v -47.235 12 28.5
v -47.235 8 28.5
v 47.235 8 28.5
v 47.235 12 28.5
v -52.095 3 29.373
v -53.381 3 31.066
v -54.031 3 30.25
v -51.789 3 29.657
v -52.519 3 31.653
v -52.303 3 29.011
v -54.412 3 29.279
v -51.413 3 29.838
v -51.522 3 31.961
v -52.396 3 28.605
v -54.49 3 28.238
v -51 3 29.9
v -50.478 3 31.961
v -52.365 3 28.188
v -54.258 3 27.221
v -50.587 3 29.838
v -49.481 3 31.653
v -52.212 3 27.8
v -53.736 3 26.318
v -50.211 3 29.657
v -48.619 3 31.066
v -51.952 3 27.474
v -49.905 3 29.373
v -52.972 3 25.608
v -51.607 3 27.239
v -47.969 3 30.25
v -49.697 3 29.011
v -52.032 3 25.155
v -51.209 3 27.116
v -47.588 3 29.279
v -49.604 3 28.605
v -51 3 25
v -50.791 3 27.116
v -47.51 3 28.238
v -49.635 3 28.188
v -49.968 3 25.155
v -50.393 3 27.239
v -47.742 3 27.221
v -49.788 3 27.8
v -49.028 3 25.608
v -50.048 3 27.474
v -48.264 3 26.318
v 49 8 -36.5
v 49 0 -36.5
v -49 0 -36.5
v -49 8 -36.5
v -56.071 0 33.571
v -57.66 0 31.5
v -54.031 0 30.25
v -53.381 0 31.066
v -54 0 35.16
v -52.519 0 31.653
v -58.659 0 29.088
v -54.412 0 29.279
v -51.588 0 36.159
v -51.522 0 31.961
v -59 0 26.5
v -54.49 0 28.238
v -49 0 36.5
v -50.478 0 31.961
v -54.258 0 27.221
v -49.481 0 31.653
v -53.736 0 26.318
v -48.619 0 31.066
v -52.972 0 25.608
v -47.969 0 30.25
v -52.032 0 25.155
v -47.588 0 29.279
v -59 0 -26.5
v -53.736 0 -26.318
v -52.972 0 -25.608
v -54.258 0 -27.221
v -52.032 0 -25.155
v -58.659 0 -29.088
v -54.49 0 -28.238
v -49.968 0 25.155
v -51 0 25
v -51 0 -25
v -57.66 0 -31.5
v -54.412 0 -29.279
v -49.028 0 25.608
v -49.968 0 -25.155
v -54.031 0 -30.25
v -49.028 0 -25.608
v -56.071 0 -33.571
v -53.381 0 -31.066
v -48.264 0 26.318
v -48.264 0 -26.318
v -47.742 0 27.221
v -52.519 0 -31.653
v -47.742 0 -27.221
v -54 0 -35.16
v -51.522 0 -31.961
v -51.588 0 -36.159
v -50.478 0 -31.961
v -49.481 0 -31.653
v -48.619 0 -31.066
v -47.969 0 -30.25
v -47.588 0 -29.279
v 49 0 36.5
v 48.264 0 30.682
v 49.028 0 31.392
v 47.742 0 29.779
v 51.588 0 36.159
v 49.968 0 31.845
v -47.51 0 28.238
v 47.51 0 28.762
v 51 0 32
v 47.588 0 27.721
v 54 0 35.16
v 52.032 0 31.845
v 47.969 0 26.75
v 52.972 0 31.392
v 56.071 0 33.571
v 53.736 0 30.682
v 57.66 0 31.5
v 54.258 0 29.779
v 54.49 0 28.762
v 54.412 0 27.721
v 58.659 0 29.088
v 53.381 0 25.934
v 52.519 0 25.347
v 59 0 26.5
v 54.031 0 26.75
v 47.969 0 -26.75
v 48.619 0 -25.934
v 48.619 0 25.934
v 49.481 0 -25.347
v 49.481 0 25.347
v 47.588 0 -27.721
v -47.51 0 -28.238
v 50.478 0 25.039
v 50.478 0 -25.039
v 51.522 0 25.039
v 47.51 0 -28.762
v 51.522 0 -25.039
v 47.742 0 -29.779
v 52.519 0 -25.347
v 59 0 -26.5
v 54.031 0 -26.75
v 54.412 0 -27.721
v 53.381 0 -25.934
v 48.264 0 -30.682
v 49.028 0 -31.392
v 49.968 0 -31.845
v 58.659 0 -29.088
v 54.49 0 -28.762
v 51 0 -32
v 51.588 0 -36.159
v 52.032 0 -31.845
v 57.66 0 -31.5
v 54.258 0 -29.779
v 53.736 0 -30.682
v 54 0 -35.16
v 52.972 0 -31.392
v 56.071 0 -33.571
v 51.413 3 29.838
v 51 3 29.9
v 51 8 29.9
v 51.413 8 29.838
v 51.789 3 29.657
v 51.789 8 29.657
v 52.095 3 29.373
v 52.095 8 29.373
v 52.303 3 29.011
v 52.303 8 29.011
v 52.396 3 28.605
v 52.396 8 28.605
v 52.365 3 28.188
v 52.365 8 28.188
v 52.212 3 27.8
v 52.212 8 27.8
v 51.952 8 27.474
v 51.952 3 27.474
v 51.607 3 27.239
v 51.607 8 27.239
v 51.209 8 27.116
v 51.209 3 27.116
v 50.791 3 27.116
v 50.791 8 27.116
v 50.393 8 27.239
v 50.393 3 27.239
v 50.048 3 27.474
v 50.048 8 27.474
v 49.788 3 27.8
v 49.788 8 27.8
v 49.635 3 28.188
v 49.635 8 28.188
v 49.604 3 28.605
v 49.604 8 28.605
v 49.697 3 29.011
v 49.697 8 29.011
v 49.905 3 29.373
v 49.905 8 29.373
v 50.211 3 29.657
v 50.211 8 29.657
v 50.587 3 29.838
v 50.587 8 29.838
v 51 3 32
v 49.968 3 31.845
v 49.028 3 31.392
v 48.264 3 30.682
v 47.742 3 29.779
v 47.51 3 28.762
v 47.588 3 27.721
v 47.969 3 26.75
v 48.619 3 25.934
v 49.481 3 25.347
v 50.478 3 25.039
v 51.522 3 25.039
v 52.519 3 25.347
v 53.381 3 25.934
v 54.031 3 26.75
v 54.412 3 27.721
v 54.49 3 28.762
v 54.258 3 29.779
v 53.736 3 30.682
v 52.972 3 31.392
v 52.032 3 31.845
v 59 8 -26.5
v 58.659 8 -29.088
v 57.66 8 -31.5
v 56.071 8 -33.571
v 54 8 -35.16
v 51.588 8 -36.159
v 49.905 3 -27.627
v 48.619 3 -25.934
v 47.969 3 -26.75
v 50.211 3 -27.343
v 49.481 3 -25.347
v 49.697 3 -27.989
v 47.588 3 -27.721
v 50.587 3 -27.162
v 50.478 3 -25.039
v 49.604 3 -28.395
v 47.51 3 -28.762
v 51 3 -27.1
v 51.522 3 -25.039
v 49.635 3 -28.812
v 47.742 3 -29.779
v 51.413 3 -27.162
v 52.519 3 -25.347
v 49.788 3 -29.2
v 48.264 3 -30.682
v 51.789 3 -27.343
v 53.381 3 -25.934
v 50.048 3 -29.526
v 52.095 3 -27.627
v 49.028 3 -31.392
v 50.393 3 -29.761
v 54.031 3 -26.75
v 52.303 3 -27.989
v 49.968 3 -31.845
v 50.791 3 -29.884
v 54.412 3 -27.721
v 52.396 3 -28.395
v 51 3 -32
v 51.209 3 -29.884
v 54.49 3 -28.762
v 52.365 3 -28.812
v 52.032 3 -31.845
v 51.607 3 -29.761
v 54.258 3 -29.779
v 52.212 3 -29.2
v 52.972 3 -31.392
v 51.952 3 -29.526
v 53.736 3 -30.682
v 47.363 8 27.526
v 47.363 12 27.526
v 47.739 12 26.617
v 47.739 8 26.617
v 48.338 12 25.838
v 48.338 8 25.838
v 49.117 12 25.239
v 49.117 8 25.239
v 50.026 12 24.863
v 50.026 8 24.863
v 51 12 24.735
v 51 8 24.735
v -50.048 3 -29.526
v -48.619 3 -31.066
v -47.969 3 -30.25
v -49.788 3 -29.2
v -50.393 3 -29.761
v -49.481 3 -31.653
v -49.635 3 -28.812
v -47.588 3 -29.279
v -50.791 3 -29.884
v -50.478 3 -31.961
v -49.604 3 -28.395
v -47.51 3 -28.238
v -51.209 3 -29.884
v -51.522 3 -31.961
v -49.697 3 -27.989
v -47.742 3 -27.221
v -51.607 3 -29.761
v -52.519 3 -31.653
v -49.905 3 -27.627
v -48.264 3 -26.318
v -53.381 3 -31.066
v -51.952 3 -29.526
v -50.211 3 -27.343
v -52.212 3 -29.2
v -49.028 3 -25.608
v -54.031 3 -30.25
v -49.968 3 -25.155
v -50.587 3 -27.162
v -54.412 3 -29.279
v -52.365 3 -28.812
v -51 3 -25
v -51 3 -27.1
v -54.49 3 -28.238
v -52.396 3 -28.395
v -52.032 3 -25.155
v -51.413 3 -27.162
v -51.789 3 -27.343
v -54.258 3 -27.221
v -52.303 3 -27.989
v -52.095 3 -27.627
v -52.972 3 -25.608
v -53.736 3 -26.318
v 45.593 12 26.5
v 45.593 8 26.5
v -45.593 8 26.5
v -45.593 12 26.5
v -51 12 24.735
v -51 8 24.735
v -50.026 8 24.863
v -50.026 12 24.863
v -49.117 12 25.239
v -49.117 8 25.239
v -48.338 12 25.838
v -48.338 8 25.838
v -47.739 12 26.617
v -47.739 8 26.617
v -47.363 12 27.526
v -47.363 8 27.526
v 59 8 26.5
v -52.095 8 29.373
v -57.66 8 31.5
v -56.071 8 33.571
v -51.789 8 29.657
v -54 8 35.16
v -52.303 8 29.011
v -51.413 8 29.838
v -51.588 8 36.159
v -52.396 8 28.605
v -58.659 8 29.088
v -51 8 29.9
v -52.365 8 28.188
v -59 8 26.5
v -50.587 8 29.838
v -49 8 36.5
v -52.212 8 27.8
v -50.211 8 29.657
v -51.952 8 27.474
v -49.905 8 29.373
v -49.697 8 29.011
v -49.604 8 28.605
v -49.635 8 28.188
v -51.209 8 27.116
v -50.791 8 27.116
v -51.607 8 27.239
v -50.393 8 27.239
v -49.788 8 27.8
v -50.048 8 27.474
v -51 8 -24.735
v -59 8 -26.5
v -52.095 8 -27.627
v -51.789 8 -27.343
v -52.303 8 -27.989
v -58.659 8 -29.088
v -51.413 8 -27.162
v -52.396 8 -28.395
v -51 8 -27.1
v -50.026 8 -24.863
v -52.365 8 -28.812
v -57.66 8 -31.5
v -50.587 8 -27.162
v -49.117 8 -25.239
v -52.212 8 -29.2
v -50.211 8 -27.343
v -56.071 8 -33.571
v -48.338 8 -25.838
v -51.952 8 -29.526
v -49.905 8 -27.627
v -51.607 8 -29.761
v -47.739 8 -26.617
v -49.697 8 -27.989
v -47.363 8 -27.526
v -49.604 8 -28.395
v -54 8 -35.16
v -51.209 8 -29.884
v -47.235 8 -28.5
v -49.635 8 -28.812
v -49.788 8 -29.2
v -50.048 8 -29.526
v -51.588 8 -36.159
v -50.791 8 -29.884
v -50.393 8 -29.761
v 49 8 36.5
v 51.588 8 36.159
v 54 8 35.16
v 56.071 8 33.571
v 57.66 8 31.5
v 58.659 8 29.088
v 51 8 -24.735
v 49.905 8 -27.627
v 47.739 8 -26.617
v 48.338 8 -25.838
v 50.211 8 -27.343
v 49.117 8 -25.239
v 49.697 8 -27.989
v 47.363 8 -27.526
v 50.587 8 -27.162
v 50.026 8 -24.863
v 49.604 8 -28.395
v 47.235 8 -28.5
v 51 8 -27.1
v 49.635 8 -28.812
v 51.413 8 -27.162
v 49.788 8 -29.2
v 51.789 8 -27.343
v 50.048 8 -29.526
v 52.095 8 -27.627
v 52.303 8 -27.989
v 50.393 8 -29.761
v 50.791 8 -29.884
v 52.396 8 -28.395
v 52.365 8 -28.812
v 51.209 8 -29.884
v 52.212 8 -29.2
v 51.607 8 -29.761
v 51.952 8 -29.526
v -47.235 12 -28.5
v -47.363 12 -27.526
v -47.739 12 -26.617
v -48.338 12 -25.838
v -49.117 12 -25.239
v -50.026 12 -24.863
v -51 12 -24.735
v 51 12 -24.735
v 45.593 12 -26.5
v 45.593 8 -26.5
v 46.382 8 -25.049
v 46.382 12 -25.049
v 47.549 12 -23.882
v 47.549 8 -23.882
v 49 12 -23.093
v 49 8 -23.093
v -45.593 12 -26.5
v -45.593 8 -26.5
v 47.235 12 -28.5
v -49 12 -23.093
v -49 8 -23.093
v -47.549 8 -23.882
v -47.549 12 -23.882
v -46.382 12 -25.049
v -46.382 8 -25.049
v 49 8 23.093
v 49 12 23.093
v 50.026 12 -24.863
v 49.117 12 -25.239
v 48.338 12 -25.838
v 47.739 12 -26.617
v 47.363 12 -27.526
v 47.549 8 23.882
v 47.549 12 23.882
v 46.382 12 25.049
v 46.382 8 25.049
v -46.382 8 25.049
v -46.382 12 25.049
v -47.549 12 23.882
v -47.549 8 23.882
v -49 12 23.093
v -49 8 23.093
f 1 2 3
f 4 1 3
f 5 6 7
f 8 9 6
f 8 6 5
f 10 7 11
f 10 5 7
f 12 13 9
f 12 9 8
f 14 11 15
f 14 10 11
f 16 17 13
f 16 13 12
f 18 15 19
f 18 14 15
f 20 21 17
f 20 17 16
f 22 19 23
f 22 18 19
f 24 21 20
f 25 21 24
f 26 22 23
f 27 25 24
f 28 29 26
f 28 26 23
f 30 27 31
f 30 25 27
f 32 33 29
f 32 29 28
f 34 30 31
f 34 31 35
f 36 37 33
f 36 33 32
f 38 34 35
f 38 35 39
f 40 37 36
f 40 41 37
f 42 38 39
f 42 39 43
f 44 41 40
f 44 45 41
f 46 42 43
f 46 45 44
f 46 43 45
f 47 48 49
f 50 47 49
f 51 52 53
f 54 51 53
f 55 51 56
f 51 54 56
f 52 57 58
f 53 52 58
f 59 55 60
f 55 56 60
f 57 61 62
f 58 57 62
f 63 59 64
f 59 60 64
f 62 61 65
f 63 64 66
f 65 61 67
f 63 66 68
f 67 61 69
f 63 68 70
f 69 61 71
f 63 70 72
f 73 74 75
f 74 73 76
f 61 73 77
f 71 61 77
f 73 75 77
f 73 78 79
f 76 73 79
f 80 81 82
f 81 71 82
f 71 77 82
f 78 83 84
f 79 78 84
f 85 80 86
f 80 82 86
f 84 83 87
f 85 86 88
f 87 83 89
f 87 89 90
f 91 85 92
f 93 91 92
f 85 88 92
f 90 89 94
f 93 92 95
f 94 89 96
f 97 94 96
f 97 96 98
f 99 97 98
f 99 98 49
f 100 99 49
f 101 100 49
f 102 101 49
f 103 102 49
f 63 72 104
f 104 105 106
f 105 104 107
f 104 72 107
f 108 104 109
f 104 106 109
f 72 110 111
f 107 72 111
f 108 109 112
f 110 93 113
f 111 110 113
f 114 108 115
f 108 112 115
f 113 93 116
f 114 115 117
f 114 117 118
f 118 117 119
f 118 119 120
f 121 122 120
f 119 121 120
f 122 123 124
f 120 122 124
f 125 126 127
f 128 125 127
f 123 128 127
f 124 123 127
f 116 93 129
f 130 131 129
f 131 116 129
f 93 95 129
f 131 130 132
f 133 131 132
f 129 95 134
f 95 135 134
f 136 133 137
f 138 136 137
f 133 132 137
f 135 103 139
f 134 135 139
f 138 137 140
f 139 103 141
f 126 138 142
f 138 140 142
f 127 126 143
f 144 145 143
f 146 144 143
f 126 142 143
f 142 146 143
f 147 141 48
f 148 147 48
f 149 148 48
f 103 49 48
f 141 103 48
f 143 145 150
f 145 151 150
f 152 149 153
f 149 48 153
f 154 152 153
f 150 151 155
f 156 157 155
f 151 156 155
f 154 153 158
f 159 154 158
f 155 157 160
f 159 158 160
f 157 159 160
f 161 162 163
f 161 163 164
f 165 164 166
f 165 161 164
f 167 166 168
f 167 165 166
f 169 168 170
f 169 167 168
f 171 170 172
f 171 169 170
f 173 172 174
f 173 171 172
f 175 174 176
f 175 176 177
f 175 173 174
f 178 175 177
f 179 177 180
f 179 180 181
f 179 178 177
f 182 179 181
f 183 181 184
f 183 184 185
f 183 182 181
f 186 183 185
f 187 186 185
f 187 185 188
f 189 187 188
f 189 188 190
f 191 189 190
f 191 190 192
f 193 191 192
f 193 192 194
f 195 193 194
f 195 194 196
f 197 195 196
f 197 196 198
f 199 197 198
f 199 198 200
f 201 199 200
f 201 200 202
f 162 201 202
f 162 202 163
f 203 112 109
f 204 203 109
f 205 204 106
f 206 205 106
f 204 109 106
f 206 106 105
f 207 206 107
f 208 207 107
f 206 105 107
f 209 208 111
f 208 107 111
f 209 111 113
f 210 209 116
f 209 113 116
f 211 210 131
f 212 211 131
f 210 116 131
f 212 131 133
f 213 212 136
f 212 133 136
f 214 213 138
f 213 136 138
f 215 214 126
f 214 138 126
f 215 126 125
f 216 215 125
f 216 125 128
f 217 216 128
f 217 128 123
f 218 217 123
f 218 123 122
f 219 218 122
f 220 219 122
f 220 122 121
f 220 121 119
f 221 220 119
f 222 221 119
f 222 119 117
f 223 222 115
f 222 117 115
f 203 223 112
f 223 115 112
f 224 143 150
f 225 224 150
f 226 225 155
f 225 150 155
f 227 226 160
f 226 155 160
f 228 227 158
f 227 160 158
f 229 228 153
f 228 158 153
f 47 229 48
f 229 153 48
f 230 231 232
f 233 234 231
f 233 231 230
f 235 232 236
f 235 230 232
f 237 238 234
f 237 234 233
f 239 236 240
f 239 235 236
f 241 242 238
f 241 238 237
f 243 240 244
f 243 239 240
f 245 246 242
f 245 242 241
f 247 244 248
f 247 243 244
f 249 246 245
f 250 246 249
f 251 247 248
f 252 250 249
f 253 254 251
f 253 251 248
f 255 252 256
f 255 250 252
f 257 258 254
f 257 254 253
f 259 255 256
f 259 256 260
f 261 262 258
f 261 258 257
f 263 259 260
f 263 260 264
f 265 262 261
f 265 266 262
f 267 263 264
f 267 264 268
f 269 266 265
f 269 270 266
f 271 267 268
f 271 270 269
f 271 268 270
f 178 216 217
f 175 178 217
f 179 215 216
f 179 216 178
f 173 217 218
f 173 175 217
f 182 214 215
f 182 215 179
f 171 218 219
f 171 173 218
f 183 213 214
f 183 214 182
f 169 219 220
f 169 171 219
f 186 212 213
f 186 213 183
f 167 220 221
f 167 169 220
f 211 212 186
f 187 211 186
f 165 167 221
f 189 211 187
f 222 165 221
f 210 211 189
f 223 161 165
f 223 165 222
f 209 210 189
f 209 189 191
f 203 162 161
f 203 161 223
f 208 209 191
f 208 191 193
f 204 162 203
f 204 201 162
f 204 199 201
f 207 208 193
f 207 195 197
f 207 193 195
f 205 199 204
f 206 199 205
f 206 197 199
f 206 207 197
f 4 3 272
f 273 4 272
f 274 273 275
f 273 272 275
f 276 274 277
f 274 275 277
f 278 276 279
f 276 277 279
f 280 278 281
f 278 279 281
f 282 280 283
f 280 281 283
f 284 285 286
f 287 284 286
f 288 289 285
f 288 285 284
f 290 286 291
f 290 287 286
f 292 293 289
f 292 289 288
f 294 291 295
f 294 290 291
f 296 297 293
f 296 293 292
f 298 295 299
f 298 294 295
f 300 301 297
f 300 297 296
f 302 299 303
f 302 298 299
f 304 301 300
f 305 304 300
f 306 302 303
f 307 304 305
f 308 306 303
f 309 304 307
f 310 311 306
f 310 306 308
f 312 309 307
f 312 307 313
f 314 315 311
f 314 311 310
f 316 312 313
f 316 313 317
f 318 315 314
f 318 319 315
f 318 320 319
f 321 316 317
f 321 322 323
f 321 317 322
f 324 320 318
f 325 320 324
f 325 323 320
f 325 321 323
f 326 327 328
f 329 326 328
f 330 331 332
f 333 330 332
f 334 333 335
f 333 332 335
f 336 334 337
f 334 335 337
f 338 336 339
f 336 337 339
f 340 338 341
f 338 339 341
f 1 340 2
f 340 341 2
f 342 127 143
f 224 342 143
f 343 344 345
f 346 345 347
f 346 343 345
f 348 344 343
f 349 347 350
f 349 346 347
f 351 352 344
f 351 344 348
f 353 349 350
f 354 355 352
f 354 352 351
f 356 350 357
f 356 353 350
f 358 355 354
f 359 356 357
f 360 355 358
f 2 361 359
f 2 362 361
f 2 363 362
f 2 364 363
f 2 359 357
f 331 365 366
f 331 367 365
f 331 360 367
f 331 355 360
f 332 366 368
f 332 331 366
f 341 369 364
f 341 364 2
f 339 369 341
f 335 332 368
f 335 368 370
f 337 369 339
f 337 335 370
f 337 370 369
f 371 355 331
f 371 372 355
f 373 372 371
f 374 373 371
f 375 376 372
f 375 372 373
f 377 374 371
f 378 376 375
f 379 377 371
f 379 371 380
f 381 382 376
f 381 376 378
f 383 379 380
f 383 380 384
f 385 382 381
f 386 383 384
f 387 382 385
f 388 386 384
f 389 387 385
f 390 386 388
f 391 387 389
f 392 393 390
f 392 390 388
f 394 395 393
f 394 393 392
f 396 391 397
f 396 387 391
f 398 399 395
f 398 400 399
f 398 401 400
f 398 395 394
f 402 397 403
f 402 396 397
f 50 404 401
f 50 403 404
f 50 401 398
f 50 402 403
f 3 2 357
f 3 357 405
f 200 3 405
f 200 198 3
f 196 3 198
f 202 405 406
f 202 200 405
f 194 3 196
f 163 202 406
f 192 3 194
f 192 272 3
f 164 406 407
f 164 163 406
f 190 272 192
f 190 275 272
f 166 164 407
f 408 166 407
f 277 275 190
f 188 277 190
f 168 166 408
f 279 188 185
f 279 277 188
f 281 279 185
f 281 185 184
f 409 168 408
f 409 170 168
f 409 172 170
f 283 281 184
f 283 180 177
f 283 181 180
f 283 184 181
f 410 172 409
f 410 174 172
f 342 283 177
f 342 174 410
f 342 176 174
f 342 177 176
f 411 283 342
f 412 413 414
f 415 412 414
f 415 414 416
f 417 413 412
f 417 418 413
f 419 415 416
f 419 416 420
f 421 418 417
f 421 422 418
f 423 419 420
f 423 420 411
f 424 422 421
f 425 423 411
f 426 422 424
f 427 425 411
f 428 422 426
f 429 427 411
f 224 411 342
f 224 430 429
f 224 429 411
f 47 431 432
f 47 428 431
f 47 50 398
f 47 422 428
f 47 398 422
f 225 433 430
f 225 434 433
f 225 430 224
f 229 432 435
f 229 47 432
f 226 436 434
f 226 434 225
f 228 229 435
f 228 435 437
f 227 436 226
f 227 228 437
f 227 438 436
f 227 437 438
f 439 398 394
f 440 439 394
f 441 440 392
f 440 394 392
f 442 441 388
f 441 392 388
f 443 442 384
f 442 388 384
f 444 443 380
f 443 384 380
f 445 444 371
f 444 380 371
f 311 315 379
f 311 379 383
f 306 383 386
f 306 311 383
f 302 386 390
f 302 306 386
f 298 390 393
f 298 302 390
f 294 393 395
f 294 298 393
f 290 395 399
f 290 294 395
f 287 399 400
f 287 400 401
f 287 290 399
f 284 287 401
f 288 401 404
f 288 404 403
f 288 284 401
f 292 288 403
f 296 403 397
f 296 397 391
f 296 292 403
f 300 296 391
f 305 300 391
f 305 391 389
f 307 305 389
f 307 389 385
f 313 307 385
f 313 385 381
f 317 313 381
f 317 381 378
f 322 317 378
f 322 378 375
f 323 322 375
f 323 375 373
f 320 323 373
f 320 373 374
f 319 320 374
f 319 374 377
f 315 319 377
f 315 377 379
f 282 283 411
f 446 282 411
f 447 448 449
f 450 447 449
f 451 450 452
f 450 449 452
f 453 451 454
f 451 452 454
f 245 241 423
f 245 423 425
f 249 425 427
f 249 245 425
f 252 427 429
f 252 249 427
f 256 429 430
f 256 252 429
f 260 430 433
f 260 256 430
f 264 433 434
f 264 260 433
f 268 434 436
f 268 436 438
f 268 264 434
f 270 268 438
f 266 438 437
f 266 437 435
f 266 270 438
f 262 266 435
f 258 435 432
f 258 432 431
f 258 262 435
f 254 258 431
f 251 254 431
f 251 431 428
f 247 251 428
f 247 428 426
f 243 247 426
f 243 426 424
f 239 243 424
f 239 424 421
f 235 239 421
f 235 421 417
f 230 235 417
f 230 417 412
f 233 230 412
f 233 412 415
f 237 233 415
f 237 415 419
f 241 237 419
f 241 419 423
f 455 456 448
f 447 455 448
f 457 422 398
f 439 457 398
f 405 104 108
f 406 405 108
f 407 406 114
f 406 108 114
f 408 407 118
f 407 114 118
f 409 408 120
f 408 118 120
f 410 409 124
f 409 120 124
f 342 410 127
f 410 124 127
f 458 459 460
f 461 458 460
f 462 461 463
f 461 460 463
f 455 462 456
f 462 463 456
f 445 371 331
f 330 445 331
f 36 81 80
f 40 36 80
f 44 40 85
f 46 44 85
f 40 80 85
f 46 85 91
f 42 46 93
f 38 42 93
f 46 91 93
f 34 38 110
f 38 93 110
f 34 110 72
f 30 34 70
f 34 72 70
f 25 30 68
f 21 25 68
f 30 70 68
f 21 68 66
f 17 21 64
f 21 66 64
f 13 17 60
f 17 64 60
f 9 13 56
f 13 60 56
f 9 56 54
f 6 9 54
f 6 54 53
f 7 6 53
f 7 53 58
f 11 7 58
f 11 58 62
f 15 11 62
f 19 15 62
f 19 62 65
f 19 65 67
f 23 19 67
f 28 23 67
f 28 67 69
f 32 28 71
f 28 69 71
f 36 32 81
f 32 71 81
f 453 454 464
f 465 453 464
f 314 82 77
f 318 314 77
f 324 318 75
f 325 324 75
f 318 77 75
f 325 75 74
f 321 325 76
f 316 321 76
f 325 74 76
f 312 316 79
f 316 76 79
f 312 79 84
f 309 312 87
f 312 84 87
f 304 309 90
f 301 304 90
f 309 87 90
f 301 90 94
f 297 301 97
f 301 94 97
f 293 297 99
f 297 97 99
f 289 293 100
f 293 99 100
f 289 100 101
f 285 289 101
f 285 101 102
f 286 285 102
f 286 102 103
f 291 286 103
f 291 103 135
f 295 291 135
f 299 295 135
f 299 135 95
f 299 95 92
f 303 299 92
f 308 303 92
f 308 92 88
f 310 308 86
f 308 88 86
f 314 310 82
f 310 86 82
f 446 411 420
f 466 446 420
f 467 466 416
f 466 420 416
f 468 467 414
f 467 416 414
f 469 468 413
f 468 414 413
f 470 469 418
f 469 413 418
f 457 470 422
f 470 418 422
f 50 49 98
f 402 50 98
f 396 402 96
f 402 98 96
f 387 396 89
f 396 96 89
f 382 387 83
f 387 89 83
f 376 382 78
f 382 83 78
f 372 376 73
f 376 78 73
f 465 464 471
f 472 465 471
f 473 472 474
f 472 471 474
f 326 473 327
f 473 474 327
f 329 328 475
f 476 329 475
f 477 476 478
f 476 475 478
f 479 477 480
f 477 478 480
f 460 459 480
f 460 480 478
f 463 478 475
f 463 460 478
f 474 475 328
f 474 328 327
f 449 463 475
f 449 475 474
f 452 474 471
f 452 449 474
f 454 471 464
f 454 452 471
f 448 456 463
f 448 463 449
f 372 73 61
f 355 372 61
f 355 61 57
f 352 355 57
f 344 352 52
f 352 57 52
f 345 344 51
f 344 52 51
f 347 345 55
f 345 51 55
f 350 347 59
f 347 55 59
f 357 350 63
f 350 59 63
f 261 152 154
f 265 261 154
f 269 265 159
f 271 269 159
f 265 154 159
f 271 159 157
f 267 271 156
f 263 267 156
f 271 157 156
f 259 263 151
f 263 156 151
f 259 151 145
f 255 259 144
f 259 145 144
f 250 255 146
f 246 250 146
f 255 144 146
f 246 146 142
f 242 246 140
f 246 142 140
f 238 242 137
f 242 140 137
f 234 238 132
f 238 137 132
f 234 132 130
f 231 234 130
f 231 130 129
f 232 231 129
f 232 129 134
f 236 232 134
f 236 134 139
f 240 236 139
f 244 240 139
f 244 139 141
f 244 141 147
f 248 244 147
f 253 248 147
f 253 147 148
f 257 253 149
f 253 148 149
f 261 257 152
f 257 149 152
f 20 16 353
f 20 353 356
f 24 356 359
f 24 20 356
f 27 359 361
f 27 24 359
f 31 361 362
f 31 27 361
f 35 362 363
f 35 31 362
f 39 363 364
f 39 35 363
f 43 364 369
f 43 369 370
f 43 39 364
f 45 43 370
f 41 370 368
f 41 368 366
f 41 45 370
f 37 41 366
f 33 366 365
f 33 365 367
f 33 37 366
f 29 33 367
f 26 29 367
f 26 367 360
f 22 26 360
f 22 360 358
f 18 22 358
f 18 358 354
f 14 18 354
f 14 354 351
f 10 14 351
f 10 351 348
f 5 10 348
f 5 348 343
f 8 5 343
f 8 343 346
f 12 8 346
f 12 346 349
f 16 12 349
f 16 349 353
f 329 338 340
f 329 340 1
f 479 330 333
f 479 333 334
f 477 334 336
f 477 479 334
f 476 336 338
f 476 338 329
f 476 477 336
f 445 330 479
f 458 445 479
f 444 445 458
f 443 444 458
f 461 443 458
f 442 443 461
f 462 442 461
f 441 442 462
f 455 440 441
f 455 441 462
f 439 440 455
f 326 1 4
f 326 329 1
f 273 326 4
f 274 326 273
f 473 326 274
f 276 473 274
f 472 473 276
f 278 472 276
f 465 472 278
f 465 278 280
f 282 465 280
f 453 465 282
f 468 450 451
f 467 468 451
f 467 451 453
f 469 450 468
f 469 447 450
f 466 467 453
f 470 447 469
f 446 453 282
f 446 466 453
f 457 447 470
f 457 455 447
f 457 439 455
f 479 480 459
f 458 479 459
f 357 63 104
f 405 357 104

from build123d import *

# Parameters (mm, degrees)
SKETCH1_R           = 1.4
BOSS_EXTRUDE1_DEPTH = 8
BOSS_EXTRUDE2_DEPTH = 8
BOSS_EXTRUDE3_DEPTH = 4
SKETCH4_R           = 3.5
CUT_EXTRUDE1_DEPTH  = 3


with BuildPart() as part:
    # Sketch1 → Boss-Extrude1 (new body)
    with BuildSketch(Plane(origin=(0, 0, 0), x_dir=(1, 0, 0), z_dir=(0, 1, 0))):
        with BuildLine():
            ThreePointArc((-49, 36.5), (-56.071067812, 33.571067812), (-59, 26.5))
            Line((-59, 26.5), (-59, -26.5))
            ThreePointArc((-59, -26.5), (-56.071067812, -33.571067812), (-49, -36.5))
            Line((-49, -36.5), (49, -36.5))
            ThreePointArc((49, -36.5), (56.071067812, -33.571067812), (59, -26.5))
            Line((59, -26.5), (59, 26.5))
            ThreePointArc((59, 26.5), (56.071067812, 33.571067812), (49, 36.5))
            Line((49, 36.5), (-49, 36.5))
        make_face()
        with Locations(Location((-51, -28.5, 0), (0, 0, 270))):
            Circle(SKETCH1_R, mode=Mode.SUBTRACT)
        with Locations(Location((51, -28.5, 0), (0, 0, 270))):
            Circle(SKETCH1_R, mode=Mode.SUBTRACT)
        with Locations(Location((-51, 28.5, 0), (0, 0, 270))):
            Circle(SKETCH1_R, mode=Mode.SUBTRACT)
        with BuildLine():
            Line((43.828427125, -28.5), (-43.828427125, -28.5))
            Line((-43.828427125, -28.5), (-47.234932778, -28.5))
            ThreePointArc((-47.234932778, -28.5), (-48.337695436, -25.837695436), (-51, -24.734932778))
            Line((-51, -24.734932778), (-51, -21.328427125))
            Line((-51, -21.328427125), (-51, 21.328427125))
            Line((-51, 21.328427125), (-51, 24.734932778))
            ThreePointArc((-51, 24.734932778), (-48.337695436, 25.837695436), (-47.234932778, 28.5))
            Line((-47.234932778, 28.5), (-43.828427125, 28.5))
            Line((-43.828427125, 28.5), (43.828427125, 28.5))
            Line((43.828427125, 28.5), (47.234932778, 28.5))
            ThreePointArc((47.234932778, 28.5), (48.337695436, 25.837695436), (51, 24.734932778))
            Line((51, 24.734932778), (51, 21.328427125))
            Line((51, 21.328427125), (51, -21.328427125))
            Line((51, -21.328427125), (51, -24.734932778))
            ThreePointArc((51, -24.734932778), (48.337695436, -25.837695436), (47.234932778, -28.5))
            Line((47.234932778, -28.5), (43.828427125, -28.5))
        make_face(mode=Mode.SUBTRACT)
        with Locations(Location((51, 28.5, 0), (0, 0, 270))):
            Circle(SKETCH1_R, mode=Mode.SUBTRACT)
    extrude(amount=BOSS_EXTRUDE1_DEPTH)



with BuildPart() as body_2:
    # Sketch2 → Boss-Extrude2 (new body)
    with BuildSketch(Plane(origin=(0, 8, 0), x_dir=(1, 0, 0), z_dir=(0, 1, 0))):
        with BuildLine():
            Line((51, -24.734932778), (51, 24.734932778))
            ThreePointArc((51, 24.734932778), (48.337695436, 25.837695436), (47.234932778, 28.5))
            Line((47.234932778, 28.5), (-47.234932778, 28.5))
            ThreePointArc((-47.234932778, 28.5), (-48.337695436, 25.837695436), (-51, 24.734932778))
            Line((-51, 24.734932778), (-51, -24.734932778))
            ThreePointArc((-51, -24.734932778), (-48.337695436, -25.837695436), (-47.234932778, -28.5))
            Line((-47.234932778, -28.5), (47.234932778, -28.5))
            ThreePointArc((47.234932778, -28.5), (48.337695436, -25.837695436), (51, -24.734932778))
        make_face()
    extrude(amount=-BOSS_EXTRUDE2_DEPTH)


with BuildPart() as part_1:
    add(part.part)

    add(body_2.part)  # Boss-Extrude3 merges body 2
    # Sketch3 → Boss-Extrude3 (add)
    with BuildSketch(Plane(origin=(0, 8, 0), x_dir=(1, 0, 0), z_dir=(0, 1, 0))):
        with BuildLine():
            ThreePointArc((47.234932778, -28.5), (48.337695436, -25.837695436), (51, -24.734932778))
            Line((51, -24.734932778), (51, 24.734932778))
            ThreePointArc((51, 24.734932778), (48.337695436, 25.837695436), (47.234932778, 28.5))
            Line((47.234932778, 28.5), (-45.234932778, 28.5))
            Line((-45.234932778, 28.5), (-47.234932778, 28.5))
            ThreePointArc((-47.234932778, 28.5), (-48.337695436, 25.837695436), (-51, 24.734932778))
            Line((-51, 24.734932778), (-51, -24.734932778))
            ThreePointArc((-51, -24.734932778), (-48.337695436, -25.837695436), (-47.234932778, -28.5))
            Line((-47.234932778, -28.5), (47.234932778, -28.5))
        make_face()
        with BuildLine():
            ThreePointArc((-49, 23.092967535), (-46.923481873, 24.423481873), (-45.592967535, 26.5))
            Line((-45.592967535, 26.5), (45.592967535, 26.5))
            ThreePointArc((45.592967535, 26.5), (46.923481873, 24.423481873), (49, 23.092967535))
            Line((49, 23.092967535), (49, -23.092967535))
            ThreePointArc((49, -23.092967535), (46.923481873, -24.423481873), (45.592967535, -26.5))
            Line((45.592967535, -26.5), (-45.592967535, -26.5))
            ThreePointArc((-45.592967535, -26.5), (-46.923481873, -24.423481873), (-49, -23.092967535))
            Line((-49, -23.092967535), (-49, 23.092967535))
        make_face(mode=Mode.SUBTRACT)
    extrude(amount=BOSS_EXTRUDE3_DEPTH)

    # Sketch4 → Cut-Extrude1 (cut)
    with BuildSketch(Plane.XZ):
        with Locations(Location((-51, 28.5, 0), (0, 0, 270))):
            Circle(SKETCH4_R)
        with Locations(Location((51, 28.5, 0), (0, 0, 90))):
            Circle(SKETCH4_R)
        with Locations(Location((51, -28.5, 0), (0, 0, 270))):
            Circle(SKETCH4_R)
        with Locations(Location((-51, -28.5, 0), (0, 0, 90))):
            Circle(SKETCH4_R)
    extrude(amount=-CUT_EXTRUDE1_DEPTH, mode=Mode.SUBTRACT)


solid = part_1.part
